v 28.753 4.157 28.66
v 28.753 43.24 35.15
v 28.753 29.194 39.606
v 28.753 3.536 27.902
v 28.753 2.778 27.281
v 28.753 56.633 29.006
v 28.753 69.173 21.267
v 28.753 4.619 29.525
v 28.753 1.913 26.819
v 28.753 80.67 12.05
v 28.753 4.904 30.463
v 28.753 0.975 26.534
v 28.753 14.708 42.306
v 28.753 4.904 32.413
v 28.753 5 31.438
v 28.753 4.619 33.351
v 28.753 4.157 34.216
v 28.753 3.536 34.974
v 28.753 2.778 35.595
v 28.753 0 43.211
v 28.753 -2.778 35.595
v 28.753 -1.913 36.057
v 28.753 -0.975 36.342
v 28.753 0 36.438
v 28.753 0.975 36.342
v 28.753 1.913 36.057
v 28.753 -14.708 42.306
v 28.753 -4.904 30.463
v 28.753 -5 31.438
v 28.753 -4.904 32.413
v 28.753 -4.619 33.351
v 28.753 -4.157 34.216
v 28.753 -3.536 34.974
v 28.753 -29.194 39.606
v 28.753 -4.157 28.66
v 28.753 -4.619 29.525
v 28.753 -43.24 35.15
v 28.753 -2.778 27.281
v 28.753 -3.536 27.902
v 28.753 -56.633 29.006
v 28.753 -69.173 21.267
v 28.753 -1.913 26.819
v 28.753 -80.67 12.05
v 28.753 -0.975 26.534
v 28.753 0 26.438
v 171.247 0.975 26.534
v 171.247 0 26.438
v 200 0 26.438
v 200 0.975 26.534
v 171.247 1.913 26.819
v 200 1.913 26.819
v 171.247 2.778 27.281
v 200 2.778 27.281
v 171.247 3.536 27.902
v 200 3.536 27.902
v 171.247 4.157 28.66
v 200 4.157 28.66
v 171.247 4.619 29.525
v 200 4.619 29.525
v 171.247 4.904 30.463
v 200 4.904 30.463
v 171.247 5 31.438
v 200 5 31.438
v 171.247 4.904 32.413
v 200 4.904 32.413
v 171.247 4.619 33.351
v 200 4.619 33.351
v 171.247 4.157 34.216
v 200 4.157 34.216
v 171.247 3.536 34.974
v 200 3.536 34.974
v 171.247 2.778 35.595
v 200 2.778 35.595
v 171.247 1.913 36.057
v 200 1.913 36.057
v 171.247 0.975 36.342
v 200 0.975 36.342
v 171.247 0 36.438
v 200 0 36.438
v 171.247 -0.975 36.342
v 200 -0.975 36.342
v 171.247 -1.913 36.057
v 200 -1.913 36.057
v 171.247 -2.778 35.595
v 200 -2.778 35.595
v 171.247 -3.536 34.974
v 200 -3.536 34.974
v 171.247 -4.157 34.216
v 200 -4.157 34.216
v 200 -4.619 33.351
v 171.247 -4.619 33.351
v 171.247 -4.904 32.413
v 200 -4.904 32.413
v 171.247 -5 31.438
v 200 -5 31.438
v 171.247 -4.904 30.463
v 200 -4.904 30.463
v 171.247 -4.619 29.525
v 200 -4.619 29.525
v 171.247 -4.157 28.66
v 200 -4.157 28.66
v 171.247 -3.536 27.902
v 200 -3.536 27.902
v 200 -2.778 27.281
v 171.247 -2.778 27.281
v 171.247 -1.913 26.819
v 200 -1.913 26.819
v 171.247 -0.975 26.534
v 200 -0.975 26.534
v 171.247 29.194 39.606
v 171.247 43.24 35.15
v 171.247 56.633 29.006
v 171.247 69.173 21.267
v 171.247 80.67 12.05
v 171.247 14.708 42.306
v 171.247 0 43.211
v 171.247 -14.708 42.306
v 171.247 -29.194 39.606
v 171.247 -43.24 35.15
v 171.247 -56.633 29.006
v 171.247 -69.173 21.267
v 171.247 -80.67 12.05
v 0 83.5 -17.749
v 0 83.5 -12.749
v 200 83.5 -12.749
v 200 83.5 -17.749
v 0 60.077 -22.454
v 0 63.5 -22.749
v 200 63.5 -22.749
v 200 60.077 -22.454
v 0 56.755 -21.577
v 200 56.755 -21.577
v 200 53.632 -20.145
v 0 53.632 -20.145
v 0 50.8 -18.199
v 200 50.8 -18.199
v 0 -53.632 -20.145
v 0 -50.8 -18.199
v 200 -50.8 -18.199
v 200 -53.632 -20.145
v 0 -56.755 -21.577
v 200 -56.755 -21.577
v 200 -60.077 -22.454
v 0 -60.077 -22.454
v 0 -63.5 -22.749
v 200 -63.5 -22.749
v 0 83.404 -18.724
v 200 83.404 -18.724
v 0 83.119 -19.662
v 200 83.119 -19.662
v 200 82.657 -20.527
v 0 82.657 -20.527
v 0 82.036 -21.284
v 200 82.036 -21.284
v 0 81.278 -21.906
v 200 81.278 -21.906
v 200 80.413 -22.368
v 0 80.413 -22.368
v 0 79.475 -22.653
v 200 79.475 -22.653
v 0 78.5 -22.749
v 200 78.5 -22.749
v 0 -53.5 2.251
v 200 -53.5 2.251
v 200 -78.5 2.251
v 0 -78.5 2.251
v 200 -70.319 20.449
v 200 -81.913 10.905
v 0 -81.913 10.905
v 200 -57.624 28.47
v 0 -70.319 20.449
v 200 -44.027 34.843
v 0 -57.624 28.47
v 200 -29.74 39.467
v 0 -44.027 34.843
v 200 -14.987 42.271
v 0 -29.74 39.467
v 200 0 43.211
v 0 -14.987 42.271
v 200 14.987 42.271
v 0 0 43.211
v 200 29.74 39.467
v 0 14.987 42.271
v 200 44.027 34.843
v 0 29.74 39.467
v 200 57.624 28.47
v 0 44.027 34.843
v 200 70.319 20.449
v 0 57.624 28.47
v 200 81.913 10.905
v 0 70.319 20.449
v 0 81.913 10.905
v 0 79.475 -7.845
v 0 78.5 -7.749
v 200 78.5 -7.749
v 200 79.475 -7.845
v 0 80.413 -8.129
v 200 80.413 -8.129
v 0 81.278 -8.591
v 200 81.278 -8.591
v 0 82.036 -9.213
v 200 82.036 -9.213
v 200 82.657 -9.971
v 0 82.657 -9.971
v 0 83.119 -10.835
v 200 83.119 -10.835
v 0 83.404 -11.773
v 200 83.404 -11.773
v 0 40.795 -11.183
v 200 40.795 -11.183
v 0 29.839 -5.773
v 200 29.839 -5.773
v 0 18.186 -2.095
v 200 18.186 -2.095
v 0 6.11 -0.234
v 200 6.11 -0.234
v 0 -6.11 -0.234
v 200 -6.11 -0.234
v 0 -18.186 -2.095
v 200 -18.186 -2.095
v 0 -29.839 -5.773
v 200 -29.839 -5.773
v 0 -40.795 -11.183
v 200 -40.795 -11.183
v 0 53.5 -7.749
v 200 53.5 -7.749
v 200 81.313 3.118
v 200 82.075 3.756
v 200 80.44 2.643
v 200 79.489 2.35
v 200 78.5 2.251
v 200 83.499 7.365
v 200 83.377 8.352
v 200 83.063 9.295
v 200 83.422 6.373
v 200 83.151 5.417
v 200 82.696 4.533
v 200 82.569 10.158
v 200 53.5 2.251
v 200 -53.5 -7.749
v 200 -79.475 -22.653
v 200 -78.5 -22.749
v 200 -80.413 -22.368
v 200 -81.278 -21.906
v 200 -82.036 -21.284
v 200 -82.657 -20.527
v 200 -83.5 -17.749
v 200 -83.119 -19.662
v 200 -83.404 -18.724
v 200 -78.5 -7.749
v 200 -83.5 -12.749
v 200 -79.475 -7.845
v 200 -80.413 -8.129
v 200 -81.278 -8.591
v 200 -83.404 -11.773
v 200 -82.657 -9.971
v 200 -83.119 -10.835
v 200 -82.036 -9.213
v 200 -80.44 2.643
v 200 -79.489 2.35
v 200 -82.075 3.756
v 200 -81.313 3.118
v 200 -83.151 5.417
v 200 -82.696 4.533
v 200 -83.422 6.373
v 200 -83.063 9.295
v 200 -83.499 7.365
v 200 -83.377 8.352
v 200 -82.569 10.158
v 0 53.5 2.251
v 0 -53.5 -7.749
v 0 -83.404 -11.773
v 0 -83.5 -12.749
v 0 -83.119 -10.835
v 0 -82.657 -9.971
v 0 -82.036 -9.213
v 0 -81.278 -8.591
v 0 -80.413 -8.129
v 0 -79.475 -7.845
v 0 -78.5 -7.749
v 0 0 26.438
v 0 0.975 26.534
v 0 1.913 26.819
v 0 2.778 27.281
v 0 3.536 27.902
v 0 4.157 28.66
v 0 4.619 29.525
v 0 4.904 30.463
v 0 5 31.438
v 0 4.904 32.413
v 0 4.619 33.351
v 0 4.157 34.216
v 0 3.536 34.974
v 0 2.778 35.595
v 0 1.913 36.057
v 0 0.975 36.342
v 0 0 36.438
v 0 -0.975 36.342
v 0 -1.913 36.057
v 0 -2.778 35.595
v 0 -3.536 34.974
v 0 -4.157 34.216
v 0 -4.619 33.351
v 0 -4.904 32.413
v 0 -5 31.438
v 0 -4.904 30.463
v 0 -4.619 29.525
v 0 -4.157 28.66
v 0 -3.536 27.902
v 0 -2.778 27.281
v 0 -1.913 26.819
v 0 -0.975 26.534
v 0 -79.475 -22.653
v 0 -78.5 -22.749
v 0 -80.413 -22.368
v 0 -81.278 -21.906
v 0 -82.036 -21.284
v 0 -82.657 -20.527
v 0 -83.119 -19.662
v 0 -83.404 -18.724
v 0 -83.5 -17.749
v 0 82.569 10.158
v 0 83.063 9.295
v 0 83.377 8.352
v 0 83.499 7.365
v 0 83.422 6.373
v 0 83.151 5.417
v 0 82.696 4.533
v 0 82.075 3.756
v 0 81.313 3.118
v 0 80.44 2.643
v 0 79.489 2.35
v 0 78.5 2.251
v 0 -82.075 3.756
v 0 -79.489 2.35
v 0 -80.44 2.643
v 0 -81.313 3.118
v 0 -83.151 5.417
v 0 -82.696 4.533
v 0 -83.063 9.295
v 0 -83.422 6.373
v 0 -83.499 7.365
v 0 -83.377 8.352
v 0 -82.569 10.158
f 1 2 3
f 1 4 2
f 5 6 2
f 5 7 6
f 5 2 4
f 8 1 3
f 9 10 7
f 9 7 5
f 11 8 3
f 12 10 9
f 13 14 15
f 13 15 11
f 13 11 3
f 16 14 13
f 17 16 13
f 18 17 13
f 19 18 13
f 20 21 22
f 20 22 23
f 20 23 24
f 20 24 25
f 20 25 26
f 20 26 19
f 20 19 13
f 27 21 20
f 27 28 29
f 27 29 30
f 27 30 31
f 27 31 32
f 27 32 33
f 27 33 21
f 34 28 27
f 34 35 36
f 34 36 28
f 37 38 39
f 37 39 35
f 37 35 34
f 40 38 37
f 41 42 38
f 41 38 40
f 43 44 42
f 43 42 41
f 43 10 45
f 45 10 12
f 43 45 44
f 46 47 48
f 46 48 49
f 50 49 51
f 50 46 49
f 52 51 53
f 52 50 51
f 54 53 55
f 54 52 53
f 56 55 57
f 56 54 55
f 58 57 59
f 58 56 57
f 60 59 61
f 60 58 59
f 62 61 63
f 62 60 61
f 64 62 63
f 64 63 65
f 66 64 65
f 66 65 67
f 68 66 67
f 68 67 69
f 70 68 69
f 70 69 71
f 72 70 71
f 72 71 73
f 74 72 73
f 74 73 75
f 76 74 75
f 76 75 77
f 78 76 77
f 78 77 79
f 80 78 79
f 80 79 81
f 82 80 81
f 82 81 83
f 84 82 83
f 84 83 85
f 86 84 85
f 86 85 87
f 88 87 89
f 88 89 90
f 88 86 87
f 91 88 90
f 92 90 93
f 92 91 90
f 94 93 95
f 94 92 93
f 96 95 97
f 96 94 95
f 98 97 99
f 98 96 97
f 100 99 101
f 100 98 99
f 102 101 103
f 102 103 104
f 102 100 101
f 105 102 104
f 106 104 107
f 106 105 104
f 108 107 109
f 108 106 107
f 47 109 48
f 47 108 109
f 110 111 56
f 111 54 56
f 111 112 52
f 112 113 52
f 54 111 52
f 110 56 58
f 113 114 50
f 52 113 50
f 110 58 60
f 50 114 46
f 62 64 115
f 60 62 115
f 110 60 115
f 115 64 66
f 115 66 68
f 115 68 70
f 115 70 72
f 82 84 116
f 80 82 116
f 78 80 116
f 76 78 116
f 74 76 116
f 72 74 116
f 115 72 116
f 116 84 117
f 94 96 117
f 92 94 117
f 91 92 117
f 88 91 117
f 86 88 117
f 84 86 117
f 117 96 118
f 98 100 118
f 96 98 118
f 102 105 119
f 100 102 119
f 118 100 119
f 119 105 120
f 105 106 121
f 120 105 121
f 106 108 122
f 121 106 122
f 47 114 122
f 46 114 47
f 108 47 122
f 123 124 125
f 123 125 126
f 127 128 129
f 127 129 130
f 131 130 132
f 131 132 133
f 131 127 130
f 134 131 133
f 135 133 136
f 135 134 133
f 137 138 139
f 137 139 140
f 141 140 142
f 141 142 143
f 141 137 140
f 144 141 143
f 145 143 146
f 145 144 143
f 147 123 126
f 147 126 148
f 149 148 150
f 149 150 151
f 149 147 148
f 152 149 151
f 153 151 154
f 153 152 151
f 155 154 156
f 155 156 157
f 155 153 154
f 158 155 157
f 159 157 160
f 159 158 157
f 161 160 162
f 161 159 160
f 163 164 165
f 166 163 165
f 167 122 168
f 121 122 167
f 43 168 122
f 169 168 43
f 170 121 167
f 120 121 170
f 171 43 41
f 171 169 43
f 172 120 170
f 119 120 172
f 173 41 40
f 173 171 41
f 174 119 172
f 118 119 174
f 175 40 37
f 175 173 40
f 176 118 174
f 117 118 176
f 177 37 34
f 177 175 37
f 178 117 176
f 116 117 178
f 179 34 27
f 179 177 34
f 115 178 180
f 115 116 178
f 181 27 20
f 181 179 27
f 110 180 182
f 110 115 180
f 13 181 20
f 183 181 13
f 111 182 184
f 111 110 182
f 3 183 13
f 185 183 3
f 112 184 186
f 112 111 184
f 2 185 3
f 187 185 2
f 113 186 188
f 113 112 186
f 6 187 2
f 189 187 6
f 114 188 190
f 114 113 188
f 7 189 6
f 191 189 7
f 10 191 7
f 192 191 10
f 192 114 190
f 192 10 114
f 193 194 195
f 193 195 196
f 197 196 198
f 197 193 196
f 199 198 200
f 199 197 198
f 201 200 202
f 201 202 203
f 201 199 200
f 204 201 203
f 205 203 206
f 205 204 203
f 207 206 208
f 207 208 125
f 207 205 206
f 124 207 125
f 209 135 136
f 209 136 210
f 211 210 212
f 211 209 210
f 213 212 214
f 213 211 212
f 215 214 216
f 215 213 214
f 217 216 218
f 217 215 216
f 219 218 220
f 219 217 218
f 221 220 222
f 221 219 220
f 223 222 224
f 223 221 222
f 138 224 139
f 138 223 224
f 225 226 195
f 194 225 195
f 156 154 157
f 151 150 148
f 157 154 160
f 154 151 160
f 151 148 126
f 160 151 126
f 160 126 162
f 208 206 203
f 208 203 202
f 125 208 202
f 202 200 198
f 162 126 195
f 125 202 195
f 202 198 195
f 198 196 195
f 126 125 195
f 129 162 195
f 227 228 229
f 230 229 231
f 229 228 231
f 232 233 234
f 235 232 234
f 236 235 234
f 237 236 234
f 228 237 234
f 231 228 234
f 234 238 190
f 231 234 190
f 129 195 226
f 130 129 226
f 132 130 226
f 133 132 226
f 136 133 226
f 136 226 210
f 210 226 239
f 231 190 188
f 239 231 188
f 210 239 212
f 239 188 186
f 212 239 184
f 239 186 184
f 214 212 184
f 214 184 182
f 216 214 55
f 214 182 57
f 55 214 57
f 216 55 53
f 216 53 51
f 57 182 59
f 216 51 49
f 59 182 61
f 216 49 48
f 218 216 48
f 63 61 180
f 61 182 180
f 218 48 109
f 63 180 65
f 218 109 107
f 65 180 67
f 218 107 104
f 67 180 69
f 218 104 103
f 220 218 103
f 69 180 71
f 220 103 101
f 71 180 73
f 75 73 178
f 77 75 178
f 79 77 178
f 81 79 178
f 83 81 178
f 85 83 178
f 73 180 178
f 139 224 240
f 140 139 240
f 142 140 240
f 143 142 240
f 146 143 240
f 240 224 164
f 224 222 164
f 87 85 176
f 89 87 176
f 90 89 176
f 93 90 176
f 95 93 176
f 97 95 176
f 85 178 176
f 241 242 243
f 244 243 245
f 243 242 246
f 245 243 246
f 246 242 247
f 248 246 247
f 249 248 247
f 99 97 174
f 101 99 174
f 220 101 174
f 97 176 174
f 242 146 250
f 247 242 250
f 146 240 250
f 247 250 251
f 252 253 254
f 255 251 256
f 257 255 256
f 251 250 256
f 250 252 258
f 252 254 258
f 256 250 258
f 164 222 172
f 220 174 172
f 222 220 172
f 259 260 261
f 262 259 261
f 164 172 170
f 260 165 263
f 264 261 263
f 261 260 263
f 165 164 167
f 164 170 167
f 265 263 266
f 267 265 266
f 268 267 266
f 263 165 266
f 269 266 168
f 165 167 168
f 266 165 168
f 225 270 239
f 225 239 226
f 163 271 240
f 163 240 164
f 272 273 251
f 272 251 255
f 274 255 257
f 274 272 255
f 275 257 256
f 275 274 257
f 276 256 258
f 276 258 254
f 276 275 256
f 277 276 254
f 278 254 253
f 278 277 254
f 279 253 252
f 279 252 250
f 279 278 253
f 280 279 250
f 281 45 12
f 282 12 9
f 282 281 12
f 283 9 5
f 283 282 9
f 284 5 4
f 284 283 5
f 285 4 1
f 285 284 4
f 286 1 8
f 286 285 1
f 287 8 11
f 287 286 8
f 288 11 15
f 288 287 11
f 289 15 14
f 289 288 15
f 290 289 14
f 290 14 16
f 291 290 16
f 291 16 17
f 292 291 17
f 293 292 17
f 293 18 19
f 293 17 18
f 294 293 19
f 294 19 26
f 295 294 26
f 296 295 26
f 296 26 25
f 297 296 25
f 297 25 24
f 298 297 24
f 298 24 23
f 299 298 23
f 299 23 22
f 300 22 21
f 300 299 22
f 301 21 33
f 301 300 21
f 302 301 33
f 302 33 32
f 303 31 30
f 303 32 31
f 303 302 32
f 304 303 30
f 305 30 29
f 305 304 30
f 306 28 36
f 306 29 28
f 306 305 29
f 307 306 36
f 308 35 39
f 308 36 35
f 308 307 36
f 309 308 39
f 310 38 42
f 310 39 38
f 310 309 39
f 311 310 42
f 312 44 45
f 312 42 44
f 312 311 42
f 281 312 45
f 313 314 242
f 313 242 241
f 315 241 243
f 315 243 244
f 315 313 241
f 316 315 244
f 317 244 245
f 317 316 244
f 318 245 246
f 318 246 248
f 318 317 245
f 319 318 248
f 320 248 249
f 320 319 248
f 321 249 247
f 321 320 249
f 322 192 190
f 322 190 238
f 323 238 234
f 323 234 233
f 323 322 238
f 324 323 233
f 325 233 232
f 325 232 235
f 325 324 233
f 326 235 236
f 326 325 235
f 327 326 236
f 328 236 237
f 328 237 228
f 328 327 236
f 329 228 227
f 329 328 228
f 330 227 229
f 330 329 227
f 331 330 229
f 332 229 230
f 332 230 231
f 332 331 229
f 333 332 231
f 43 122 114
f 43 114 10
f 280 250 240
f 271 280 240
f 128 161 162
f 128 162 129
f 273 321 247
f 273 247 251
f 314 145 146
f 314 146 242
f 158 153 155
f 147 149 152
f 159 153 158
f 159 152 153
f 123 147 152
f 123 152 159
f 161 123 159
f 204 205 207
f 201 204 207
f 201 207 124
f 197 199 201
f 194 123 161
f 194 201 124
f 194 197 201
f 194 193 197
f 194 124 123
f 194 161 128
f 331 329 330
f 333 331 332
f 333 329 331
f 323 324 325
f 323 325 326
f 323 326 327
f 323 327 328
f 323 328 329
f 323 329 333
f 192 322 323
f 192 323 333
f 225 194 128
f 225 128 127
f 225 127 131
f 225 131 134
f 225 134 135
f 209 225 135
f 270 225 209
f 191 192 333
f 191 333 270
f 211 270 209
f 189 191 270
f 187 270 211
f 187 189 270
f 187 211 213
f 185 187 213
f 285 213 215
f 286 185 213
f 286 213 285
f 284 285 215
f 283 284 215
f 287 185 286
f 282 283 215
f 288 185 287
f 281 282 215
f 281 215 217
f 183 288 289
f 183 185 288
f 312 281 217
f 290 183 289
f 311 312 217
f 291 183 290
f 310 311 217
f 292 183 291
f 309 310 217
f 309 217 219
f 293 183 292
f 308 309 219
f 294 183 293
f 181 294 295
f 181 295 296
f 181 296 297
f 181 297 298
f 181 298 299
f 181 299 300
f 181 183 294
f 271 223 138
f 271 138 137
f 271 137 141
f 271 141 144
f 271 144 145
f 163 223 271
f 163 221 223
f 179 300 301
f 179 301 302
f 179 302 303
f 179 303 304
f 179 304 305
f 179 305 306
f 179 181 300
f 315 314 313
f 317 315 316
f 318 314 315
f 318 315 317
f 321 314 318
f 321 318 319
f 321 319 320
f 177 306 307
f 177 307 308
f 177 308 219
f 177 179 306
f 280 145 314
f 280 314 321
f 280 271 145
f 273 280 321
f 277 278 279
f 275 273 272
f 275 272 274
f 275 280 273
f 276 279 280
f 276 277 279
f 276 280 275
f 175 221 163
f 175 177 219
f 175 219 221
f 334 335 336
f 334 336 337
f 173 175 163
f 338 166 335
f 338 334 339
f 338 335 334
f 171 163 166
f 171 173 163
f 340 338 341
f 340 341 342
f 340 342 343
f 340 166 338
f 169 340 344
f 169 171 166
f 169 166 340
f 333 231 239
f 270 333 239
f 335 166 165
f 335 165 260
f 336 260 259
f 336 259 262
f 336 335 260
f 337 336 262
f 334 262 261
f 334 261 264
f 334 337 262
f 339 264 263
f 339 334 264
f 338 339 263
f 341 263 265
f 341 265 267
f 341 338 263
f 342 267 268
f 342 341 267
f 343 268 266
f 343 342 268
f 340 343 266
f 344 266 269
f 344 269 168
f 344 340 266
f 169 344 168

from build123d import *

# Parameters (mm, degrees)
SKETCH2_R               = 5
BOSS_EXTRUDE1_DEPTH     = 200
CUT_EXTRUDE1_DEPTH      = 221.996480462
CUT_EXTRUDE1_DEPTH_BACK = 221.996480462
SKETCH3_W               = 142.494389282
SKETCH3_H               = 38.776173082


with BuildPart() as part:
    # Sketch2 → Boss-Extrude1 (new body)
    with BuildSketch(Plane.YZ):
        with BuildLine():
            Line((-63.5, -22.748786417), (-78.5, -22.748786417))
            ThreePointArc((-78.5, -22.748786417), (-82.035533906, -21.284320323), (-83.5, -17.748786417))
            Line((-83.5, -17.748786417), (-83.5, -12.748786417))
            ThreePointArc((-83.5, -12.748786417), (-82.035533906, -9.213252511), (-78.5, -7.748786417))
            Line((-78.5, -7.748786417), (-53.5, -7.748786417))
            Line((-53.5, -7.748786417), (-53.5, 2.251213583))
            Line((-53.5, 2.251213583), (-78.5, 2.251213583))
            ThreePointArc((-78.5, 2.251213583), (-83.151322497, 5.416765702), (-81.913043478, 10.905133973))
            ThreePointArc((-81.913043478, 10.905133973), (0, 43.211044616), (81.913043478, 10.905133973))
            ThreePointArc((81.913043478, 10.905133973), (83.151322497, 5.416765702), (78.5, 2.251213583))
            Line((78.5, 2.251213583), (53.5, 2.251213583))
            Line((53.5, 2.251213583), (53.5, -7.748786417))
            Line((53.5, -7.748786417), (78.5, -7.748786417))
            ThreePointArc((78.5, -7.748786417), (82.035533906, -9.213252511), (83.5, -12.748786417))
            Line((83.5, -12.748786417), (83.5, -17.748786417))
            ThreePointArc((83.5, -17.748786417), (82.035533906, -21.284320323), (78.5, -22.748786417))
            Line((78.5, -22.748786417), (63.5, -22.748786417))
            ThreePointArc((63.5, -22.748786417), (56.754811134, -21.577021257), (50.8, -18.199029134))
            ThreePointArc((50.8, -18.199029134), (0, 0), (-50.8, -18.199029134))
            ThreePointArc((-50.8, -18.199029134), (-56.754811134, -21.577021257), (-63.5, -22.748786417))
        make_face()
        with Locations(Location((0, 31.437967685, 0), (0, 0, 270))):
            Circle(SKETCH2_R, mode=Mode.SUBTRACT)
    extrude(amount=BOSS_EXTRUDE1_DEPTH)

    # Sketch3 → Cut-Extrude1 (cut, two sides: drawn at the far end of the back side and taken through both)
    with BuildSketch(Plane(origin=(0, 0, 0), x_dir=(-1, 0, 0), z_dir=(0, 1, 0)).offset(-CUT_EXTRUDE1_DEPTH_BACK)):
        with Locations((-100, 31.437967685)):
            Rectangle(SKETCH3_W, SKETCH3_H)
    extrude(amount=CUT_EXTRUDE1_DEPTH + CUT_EXTRUDE1_DEPTH_BACK, mode=Mode.SUBTRACT)


solid = part.part
